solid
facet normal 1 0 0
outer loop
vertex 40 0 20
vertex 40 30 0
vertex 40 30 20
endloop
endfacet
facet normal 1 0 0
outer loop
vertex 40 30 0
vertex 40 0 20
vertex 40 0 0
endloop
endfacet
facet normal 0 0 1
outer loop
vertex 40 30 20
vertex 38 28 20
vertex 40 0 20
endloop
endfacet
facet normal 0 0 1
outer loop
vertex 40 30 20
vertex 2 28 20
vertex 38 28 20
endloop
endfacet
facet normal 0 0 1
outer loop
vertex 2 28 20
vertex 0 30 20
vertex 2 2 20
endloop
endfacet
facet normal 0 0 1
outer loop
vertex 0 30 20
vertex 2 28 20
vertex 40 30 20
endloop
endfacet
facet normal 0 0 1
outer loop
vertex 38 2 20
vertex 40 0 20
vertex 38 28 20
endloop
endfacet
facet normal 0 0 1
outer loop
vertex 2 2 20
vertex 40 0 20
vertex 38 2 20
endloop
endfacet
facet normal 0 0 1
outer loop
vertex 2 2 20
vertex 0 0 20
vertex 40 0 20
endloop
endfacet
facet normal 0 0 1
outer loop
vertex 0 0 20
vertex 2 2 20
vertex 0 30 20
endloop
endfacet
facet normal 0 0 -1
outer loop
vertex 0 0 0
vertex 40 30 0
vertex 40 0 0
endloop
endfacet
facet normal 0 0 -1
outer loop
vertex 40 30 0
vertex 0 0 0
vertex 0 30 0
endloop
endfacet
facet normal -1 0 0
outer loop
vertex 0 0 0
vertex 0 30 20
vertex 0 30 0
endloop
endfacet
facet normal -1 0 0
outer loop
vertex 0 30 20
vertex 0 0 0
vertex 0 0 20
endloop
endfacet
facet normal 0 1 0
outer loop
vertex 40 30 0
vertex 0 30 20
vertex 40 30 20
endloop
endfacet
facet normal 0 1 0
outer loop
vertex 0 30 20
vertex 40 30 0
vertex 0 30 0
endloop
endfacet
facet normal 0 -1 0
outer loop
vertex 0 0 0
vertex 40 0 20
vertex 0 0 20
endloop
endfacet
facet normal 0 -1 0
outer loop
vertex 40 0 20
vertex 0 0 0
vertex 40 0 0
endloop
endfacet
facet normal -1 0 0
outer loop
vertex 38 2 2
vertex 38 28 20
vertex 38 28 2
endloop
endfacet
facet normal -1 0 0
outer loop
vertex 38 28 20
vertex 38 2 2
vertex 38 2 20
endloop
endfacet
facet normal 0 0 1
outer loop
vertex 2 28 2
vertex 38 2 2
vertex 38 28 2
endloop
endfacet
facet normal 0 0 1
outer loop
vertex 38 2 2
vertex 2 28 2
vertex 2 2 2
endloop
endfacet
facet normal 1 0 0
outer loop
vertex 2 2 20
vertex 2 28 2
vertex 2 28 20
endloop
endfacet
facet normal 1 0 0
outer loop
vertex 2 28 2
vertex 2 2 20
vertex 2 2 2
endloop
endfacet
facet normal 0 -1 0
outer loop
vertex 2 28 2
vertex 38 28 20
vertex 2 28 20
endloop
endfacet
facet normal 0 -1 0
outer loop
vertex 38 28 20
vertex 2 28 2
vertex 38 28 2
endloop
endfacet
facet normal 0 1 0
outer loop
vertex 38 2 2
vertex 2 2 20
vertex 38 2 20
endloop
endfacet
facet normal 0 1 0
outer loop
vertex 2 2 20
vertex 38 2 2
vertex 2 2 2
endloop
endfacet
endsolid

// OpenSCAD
// Generated by HEIDI for job job_1787696805096_1dfb2caa
// Product: 3D-Printable Model Preparation Package
// Request: A small box container 40x30x20mm
// Model type: box
// Generated: 2026-08-25T22:26:45.196Z
//
// This is a parameterized OpenSCAD model. You can adjust the
// parameters below to customize the dimensions before rendering.

// ─── Parameters ───
width = 40;       // X dimension in mm
height = 30;     // Y dimension in mm
depth = 20;       // Z dimension in mm
wall = 2;    // wall thickness in mm
$fn = 60;               // facet resolution

// Parametric hollow box
module parametric_box() {
    difference() {
        // Outer shell
        cube([width, height, depth]);
        // Inner cavity
        translate([wall, wall, wall])
            cube([width - wall * 2, height - wall * 2, depth - wall + 1]);
    }
}
parametric_box();
